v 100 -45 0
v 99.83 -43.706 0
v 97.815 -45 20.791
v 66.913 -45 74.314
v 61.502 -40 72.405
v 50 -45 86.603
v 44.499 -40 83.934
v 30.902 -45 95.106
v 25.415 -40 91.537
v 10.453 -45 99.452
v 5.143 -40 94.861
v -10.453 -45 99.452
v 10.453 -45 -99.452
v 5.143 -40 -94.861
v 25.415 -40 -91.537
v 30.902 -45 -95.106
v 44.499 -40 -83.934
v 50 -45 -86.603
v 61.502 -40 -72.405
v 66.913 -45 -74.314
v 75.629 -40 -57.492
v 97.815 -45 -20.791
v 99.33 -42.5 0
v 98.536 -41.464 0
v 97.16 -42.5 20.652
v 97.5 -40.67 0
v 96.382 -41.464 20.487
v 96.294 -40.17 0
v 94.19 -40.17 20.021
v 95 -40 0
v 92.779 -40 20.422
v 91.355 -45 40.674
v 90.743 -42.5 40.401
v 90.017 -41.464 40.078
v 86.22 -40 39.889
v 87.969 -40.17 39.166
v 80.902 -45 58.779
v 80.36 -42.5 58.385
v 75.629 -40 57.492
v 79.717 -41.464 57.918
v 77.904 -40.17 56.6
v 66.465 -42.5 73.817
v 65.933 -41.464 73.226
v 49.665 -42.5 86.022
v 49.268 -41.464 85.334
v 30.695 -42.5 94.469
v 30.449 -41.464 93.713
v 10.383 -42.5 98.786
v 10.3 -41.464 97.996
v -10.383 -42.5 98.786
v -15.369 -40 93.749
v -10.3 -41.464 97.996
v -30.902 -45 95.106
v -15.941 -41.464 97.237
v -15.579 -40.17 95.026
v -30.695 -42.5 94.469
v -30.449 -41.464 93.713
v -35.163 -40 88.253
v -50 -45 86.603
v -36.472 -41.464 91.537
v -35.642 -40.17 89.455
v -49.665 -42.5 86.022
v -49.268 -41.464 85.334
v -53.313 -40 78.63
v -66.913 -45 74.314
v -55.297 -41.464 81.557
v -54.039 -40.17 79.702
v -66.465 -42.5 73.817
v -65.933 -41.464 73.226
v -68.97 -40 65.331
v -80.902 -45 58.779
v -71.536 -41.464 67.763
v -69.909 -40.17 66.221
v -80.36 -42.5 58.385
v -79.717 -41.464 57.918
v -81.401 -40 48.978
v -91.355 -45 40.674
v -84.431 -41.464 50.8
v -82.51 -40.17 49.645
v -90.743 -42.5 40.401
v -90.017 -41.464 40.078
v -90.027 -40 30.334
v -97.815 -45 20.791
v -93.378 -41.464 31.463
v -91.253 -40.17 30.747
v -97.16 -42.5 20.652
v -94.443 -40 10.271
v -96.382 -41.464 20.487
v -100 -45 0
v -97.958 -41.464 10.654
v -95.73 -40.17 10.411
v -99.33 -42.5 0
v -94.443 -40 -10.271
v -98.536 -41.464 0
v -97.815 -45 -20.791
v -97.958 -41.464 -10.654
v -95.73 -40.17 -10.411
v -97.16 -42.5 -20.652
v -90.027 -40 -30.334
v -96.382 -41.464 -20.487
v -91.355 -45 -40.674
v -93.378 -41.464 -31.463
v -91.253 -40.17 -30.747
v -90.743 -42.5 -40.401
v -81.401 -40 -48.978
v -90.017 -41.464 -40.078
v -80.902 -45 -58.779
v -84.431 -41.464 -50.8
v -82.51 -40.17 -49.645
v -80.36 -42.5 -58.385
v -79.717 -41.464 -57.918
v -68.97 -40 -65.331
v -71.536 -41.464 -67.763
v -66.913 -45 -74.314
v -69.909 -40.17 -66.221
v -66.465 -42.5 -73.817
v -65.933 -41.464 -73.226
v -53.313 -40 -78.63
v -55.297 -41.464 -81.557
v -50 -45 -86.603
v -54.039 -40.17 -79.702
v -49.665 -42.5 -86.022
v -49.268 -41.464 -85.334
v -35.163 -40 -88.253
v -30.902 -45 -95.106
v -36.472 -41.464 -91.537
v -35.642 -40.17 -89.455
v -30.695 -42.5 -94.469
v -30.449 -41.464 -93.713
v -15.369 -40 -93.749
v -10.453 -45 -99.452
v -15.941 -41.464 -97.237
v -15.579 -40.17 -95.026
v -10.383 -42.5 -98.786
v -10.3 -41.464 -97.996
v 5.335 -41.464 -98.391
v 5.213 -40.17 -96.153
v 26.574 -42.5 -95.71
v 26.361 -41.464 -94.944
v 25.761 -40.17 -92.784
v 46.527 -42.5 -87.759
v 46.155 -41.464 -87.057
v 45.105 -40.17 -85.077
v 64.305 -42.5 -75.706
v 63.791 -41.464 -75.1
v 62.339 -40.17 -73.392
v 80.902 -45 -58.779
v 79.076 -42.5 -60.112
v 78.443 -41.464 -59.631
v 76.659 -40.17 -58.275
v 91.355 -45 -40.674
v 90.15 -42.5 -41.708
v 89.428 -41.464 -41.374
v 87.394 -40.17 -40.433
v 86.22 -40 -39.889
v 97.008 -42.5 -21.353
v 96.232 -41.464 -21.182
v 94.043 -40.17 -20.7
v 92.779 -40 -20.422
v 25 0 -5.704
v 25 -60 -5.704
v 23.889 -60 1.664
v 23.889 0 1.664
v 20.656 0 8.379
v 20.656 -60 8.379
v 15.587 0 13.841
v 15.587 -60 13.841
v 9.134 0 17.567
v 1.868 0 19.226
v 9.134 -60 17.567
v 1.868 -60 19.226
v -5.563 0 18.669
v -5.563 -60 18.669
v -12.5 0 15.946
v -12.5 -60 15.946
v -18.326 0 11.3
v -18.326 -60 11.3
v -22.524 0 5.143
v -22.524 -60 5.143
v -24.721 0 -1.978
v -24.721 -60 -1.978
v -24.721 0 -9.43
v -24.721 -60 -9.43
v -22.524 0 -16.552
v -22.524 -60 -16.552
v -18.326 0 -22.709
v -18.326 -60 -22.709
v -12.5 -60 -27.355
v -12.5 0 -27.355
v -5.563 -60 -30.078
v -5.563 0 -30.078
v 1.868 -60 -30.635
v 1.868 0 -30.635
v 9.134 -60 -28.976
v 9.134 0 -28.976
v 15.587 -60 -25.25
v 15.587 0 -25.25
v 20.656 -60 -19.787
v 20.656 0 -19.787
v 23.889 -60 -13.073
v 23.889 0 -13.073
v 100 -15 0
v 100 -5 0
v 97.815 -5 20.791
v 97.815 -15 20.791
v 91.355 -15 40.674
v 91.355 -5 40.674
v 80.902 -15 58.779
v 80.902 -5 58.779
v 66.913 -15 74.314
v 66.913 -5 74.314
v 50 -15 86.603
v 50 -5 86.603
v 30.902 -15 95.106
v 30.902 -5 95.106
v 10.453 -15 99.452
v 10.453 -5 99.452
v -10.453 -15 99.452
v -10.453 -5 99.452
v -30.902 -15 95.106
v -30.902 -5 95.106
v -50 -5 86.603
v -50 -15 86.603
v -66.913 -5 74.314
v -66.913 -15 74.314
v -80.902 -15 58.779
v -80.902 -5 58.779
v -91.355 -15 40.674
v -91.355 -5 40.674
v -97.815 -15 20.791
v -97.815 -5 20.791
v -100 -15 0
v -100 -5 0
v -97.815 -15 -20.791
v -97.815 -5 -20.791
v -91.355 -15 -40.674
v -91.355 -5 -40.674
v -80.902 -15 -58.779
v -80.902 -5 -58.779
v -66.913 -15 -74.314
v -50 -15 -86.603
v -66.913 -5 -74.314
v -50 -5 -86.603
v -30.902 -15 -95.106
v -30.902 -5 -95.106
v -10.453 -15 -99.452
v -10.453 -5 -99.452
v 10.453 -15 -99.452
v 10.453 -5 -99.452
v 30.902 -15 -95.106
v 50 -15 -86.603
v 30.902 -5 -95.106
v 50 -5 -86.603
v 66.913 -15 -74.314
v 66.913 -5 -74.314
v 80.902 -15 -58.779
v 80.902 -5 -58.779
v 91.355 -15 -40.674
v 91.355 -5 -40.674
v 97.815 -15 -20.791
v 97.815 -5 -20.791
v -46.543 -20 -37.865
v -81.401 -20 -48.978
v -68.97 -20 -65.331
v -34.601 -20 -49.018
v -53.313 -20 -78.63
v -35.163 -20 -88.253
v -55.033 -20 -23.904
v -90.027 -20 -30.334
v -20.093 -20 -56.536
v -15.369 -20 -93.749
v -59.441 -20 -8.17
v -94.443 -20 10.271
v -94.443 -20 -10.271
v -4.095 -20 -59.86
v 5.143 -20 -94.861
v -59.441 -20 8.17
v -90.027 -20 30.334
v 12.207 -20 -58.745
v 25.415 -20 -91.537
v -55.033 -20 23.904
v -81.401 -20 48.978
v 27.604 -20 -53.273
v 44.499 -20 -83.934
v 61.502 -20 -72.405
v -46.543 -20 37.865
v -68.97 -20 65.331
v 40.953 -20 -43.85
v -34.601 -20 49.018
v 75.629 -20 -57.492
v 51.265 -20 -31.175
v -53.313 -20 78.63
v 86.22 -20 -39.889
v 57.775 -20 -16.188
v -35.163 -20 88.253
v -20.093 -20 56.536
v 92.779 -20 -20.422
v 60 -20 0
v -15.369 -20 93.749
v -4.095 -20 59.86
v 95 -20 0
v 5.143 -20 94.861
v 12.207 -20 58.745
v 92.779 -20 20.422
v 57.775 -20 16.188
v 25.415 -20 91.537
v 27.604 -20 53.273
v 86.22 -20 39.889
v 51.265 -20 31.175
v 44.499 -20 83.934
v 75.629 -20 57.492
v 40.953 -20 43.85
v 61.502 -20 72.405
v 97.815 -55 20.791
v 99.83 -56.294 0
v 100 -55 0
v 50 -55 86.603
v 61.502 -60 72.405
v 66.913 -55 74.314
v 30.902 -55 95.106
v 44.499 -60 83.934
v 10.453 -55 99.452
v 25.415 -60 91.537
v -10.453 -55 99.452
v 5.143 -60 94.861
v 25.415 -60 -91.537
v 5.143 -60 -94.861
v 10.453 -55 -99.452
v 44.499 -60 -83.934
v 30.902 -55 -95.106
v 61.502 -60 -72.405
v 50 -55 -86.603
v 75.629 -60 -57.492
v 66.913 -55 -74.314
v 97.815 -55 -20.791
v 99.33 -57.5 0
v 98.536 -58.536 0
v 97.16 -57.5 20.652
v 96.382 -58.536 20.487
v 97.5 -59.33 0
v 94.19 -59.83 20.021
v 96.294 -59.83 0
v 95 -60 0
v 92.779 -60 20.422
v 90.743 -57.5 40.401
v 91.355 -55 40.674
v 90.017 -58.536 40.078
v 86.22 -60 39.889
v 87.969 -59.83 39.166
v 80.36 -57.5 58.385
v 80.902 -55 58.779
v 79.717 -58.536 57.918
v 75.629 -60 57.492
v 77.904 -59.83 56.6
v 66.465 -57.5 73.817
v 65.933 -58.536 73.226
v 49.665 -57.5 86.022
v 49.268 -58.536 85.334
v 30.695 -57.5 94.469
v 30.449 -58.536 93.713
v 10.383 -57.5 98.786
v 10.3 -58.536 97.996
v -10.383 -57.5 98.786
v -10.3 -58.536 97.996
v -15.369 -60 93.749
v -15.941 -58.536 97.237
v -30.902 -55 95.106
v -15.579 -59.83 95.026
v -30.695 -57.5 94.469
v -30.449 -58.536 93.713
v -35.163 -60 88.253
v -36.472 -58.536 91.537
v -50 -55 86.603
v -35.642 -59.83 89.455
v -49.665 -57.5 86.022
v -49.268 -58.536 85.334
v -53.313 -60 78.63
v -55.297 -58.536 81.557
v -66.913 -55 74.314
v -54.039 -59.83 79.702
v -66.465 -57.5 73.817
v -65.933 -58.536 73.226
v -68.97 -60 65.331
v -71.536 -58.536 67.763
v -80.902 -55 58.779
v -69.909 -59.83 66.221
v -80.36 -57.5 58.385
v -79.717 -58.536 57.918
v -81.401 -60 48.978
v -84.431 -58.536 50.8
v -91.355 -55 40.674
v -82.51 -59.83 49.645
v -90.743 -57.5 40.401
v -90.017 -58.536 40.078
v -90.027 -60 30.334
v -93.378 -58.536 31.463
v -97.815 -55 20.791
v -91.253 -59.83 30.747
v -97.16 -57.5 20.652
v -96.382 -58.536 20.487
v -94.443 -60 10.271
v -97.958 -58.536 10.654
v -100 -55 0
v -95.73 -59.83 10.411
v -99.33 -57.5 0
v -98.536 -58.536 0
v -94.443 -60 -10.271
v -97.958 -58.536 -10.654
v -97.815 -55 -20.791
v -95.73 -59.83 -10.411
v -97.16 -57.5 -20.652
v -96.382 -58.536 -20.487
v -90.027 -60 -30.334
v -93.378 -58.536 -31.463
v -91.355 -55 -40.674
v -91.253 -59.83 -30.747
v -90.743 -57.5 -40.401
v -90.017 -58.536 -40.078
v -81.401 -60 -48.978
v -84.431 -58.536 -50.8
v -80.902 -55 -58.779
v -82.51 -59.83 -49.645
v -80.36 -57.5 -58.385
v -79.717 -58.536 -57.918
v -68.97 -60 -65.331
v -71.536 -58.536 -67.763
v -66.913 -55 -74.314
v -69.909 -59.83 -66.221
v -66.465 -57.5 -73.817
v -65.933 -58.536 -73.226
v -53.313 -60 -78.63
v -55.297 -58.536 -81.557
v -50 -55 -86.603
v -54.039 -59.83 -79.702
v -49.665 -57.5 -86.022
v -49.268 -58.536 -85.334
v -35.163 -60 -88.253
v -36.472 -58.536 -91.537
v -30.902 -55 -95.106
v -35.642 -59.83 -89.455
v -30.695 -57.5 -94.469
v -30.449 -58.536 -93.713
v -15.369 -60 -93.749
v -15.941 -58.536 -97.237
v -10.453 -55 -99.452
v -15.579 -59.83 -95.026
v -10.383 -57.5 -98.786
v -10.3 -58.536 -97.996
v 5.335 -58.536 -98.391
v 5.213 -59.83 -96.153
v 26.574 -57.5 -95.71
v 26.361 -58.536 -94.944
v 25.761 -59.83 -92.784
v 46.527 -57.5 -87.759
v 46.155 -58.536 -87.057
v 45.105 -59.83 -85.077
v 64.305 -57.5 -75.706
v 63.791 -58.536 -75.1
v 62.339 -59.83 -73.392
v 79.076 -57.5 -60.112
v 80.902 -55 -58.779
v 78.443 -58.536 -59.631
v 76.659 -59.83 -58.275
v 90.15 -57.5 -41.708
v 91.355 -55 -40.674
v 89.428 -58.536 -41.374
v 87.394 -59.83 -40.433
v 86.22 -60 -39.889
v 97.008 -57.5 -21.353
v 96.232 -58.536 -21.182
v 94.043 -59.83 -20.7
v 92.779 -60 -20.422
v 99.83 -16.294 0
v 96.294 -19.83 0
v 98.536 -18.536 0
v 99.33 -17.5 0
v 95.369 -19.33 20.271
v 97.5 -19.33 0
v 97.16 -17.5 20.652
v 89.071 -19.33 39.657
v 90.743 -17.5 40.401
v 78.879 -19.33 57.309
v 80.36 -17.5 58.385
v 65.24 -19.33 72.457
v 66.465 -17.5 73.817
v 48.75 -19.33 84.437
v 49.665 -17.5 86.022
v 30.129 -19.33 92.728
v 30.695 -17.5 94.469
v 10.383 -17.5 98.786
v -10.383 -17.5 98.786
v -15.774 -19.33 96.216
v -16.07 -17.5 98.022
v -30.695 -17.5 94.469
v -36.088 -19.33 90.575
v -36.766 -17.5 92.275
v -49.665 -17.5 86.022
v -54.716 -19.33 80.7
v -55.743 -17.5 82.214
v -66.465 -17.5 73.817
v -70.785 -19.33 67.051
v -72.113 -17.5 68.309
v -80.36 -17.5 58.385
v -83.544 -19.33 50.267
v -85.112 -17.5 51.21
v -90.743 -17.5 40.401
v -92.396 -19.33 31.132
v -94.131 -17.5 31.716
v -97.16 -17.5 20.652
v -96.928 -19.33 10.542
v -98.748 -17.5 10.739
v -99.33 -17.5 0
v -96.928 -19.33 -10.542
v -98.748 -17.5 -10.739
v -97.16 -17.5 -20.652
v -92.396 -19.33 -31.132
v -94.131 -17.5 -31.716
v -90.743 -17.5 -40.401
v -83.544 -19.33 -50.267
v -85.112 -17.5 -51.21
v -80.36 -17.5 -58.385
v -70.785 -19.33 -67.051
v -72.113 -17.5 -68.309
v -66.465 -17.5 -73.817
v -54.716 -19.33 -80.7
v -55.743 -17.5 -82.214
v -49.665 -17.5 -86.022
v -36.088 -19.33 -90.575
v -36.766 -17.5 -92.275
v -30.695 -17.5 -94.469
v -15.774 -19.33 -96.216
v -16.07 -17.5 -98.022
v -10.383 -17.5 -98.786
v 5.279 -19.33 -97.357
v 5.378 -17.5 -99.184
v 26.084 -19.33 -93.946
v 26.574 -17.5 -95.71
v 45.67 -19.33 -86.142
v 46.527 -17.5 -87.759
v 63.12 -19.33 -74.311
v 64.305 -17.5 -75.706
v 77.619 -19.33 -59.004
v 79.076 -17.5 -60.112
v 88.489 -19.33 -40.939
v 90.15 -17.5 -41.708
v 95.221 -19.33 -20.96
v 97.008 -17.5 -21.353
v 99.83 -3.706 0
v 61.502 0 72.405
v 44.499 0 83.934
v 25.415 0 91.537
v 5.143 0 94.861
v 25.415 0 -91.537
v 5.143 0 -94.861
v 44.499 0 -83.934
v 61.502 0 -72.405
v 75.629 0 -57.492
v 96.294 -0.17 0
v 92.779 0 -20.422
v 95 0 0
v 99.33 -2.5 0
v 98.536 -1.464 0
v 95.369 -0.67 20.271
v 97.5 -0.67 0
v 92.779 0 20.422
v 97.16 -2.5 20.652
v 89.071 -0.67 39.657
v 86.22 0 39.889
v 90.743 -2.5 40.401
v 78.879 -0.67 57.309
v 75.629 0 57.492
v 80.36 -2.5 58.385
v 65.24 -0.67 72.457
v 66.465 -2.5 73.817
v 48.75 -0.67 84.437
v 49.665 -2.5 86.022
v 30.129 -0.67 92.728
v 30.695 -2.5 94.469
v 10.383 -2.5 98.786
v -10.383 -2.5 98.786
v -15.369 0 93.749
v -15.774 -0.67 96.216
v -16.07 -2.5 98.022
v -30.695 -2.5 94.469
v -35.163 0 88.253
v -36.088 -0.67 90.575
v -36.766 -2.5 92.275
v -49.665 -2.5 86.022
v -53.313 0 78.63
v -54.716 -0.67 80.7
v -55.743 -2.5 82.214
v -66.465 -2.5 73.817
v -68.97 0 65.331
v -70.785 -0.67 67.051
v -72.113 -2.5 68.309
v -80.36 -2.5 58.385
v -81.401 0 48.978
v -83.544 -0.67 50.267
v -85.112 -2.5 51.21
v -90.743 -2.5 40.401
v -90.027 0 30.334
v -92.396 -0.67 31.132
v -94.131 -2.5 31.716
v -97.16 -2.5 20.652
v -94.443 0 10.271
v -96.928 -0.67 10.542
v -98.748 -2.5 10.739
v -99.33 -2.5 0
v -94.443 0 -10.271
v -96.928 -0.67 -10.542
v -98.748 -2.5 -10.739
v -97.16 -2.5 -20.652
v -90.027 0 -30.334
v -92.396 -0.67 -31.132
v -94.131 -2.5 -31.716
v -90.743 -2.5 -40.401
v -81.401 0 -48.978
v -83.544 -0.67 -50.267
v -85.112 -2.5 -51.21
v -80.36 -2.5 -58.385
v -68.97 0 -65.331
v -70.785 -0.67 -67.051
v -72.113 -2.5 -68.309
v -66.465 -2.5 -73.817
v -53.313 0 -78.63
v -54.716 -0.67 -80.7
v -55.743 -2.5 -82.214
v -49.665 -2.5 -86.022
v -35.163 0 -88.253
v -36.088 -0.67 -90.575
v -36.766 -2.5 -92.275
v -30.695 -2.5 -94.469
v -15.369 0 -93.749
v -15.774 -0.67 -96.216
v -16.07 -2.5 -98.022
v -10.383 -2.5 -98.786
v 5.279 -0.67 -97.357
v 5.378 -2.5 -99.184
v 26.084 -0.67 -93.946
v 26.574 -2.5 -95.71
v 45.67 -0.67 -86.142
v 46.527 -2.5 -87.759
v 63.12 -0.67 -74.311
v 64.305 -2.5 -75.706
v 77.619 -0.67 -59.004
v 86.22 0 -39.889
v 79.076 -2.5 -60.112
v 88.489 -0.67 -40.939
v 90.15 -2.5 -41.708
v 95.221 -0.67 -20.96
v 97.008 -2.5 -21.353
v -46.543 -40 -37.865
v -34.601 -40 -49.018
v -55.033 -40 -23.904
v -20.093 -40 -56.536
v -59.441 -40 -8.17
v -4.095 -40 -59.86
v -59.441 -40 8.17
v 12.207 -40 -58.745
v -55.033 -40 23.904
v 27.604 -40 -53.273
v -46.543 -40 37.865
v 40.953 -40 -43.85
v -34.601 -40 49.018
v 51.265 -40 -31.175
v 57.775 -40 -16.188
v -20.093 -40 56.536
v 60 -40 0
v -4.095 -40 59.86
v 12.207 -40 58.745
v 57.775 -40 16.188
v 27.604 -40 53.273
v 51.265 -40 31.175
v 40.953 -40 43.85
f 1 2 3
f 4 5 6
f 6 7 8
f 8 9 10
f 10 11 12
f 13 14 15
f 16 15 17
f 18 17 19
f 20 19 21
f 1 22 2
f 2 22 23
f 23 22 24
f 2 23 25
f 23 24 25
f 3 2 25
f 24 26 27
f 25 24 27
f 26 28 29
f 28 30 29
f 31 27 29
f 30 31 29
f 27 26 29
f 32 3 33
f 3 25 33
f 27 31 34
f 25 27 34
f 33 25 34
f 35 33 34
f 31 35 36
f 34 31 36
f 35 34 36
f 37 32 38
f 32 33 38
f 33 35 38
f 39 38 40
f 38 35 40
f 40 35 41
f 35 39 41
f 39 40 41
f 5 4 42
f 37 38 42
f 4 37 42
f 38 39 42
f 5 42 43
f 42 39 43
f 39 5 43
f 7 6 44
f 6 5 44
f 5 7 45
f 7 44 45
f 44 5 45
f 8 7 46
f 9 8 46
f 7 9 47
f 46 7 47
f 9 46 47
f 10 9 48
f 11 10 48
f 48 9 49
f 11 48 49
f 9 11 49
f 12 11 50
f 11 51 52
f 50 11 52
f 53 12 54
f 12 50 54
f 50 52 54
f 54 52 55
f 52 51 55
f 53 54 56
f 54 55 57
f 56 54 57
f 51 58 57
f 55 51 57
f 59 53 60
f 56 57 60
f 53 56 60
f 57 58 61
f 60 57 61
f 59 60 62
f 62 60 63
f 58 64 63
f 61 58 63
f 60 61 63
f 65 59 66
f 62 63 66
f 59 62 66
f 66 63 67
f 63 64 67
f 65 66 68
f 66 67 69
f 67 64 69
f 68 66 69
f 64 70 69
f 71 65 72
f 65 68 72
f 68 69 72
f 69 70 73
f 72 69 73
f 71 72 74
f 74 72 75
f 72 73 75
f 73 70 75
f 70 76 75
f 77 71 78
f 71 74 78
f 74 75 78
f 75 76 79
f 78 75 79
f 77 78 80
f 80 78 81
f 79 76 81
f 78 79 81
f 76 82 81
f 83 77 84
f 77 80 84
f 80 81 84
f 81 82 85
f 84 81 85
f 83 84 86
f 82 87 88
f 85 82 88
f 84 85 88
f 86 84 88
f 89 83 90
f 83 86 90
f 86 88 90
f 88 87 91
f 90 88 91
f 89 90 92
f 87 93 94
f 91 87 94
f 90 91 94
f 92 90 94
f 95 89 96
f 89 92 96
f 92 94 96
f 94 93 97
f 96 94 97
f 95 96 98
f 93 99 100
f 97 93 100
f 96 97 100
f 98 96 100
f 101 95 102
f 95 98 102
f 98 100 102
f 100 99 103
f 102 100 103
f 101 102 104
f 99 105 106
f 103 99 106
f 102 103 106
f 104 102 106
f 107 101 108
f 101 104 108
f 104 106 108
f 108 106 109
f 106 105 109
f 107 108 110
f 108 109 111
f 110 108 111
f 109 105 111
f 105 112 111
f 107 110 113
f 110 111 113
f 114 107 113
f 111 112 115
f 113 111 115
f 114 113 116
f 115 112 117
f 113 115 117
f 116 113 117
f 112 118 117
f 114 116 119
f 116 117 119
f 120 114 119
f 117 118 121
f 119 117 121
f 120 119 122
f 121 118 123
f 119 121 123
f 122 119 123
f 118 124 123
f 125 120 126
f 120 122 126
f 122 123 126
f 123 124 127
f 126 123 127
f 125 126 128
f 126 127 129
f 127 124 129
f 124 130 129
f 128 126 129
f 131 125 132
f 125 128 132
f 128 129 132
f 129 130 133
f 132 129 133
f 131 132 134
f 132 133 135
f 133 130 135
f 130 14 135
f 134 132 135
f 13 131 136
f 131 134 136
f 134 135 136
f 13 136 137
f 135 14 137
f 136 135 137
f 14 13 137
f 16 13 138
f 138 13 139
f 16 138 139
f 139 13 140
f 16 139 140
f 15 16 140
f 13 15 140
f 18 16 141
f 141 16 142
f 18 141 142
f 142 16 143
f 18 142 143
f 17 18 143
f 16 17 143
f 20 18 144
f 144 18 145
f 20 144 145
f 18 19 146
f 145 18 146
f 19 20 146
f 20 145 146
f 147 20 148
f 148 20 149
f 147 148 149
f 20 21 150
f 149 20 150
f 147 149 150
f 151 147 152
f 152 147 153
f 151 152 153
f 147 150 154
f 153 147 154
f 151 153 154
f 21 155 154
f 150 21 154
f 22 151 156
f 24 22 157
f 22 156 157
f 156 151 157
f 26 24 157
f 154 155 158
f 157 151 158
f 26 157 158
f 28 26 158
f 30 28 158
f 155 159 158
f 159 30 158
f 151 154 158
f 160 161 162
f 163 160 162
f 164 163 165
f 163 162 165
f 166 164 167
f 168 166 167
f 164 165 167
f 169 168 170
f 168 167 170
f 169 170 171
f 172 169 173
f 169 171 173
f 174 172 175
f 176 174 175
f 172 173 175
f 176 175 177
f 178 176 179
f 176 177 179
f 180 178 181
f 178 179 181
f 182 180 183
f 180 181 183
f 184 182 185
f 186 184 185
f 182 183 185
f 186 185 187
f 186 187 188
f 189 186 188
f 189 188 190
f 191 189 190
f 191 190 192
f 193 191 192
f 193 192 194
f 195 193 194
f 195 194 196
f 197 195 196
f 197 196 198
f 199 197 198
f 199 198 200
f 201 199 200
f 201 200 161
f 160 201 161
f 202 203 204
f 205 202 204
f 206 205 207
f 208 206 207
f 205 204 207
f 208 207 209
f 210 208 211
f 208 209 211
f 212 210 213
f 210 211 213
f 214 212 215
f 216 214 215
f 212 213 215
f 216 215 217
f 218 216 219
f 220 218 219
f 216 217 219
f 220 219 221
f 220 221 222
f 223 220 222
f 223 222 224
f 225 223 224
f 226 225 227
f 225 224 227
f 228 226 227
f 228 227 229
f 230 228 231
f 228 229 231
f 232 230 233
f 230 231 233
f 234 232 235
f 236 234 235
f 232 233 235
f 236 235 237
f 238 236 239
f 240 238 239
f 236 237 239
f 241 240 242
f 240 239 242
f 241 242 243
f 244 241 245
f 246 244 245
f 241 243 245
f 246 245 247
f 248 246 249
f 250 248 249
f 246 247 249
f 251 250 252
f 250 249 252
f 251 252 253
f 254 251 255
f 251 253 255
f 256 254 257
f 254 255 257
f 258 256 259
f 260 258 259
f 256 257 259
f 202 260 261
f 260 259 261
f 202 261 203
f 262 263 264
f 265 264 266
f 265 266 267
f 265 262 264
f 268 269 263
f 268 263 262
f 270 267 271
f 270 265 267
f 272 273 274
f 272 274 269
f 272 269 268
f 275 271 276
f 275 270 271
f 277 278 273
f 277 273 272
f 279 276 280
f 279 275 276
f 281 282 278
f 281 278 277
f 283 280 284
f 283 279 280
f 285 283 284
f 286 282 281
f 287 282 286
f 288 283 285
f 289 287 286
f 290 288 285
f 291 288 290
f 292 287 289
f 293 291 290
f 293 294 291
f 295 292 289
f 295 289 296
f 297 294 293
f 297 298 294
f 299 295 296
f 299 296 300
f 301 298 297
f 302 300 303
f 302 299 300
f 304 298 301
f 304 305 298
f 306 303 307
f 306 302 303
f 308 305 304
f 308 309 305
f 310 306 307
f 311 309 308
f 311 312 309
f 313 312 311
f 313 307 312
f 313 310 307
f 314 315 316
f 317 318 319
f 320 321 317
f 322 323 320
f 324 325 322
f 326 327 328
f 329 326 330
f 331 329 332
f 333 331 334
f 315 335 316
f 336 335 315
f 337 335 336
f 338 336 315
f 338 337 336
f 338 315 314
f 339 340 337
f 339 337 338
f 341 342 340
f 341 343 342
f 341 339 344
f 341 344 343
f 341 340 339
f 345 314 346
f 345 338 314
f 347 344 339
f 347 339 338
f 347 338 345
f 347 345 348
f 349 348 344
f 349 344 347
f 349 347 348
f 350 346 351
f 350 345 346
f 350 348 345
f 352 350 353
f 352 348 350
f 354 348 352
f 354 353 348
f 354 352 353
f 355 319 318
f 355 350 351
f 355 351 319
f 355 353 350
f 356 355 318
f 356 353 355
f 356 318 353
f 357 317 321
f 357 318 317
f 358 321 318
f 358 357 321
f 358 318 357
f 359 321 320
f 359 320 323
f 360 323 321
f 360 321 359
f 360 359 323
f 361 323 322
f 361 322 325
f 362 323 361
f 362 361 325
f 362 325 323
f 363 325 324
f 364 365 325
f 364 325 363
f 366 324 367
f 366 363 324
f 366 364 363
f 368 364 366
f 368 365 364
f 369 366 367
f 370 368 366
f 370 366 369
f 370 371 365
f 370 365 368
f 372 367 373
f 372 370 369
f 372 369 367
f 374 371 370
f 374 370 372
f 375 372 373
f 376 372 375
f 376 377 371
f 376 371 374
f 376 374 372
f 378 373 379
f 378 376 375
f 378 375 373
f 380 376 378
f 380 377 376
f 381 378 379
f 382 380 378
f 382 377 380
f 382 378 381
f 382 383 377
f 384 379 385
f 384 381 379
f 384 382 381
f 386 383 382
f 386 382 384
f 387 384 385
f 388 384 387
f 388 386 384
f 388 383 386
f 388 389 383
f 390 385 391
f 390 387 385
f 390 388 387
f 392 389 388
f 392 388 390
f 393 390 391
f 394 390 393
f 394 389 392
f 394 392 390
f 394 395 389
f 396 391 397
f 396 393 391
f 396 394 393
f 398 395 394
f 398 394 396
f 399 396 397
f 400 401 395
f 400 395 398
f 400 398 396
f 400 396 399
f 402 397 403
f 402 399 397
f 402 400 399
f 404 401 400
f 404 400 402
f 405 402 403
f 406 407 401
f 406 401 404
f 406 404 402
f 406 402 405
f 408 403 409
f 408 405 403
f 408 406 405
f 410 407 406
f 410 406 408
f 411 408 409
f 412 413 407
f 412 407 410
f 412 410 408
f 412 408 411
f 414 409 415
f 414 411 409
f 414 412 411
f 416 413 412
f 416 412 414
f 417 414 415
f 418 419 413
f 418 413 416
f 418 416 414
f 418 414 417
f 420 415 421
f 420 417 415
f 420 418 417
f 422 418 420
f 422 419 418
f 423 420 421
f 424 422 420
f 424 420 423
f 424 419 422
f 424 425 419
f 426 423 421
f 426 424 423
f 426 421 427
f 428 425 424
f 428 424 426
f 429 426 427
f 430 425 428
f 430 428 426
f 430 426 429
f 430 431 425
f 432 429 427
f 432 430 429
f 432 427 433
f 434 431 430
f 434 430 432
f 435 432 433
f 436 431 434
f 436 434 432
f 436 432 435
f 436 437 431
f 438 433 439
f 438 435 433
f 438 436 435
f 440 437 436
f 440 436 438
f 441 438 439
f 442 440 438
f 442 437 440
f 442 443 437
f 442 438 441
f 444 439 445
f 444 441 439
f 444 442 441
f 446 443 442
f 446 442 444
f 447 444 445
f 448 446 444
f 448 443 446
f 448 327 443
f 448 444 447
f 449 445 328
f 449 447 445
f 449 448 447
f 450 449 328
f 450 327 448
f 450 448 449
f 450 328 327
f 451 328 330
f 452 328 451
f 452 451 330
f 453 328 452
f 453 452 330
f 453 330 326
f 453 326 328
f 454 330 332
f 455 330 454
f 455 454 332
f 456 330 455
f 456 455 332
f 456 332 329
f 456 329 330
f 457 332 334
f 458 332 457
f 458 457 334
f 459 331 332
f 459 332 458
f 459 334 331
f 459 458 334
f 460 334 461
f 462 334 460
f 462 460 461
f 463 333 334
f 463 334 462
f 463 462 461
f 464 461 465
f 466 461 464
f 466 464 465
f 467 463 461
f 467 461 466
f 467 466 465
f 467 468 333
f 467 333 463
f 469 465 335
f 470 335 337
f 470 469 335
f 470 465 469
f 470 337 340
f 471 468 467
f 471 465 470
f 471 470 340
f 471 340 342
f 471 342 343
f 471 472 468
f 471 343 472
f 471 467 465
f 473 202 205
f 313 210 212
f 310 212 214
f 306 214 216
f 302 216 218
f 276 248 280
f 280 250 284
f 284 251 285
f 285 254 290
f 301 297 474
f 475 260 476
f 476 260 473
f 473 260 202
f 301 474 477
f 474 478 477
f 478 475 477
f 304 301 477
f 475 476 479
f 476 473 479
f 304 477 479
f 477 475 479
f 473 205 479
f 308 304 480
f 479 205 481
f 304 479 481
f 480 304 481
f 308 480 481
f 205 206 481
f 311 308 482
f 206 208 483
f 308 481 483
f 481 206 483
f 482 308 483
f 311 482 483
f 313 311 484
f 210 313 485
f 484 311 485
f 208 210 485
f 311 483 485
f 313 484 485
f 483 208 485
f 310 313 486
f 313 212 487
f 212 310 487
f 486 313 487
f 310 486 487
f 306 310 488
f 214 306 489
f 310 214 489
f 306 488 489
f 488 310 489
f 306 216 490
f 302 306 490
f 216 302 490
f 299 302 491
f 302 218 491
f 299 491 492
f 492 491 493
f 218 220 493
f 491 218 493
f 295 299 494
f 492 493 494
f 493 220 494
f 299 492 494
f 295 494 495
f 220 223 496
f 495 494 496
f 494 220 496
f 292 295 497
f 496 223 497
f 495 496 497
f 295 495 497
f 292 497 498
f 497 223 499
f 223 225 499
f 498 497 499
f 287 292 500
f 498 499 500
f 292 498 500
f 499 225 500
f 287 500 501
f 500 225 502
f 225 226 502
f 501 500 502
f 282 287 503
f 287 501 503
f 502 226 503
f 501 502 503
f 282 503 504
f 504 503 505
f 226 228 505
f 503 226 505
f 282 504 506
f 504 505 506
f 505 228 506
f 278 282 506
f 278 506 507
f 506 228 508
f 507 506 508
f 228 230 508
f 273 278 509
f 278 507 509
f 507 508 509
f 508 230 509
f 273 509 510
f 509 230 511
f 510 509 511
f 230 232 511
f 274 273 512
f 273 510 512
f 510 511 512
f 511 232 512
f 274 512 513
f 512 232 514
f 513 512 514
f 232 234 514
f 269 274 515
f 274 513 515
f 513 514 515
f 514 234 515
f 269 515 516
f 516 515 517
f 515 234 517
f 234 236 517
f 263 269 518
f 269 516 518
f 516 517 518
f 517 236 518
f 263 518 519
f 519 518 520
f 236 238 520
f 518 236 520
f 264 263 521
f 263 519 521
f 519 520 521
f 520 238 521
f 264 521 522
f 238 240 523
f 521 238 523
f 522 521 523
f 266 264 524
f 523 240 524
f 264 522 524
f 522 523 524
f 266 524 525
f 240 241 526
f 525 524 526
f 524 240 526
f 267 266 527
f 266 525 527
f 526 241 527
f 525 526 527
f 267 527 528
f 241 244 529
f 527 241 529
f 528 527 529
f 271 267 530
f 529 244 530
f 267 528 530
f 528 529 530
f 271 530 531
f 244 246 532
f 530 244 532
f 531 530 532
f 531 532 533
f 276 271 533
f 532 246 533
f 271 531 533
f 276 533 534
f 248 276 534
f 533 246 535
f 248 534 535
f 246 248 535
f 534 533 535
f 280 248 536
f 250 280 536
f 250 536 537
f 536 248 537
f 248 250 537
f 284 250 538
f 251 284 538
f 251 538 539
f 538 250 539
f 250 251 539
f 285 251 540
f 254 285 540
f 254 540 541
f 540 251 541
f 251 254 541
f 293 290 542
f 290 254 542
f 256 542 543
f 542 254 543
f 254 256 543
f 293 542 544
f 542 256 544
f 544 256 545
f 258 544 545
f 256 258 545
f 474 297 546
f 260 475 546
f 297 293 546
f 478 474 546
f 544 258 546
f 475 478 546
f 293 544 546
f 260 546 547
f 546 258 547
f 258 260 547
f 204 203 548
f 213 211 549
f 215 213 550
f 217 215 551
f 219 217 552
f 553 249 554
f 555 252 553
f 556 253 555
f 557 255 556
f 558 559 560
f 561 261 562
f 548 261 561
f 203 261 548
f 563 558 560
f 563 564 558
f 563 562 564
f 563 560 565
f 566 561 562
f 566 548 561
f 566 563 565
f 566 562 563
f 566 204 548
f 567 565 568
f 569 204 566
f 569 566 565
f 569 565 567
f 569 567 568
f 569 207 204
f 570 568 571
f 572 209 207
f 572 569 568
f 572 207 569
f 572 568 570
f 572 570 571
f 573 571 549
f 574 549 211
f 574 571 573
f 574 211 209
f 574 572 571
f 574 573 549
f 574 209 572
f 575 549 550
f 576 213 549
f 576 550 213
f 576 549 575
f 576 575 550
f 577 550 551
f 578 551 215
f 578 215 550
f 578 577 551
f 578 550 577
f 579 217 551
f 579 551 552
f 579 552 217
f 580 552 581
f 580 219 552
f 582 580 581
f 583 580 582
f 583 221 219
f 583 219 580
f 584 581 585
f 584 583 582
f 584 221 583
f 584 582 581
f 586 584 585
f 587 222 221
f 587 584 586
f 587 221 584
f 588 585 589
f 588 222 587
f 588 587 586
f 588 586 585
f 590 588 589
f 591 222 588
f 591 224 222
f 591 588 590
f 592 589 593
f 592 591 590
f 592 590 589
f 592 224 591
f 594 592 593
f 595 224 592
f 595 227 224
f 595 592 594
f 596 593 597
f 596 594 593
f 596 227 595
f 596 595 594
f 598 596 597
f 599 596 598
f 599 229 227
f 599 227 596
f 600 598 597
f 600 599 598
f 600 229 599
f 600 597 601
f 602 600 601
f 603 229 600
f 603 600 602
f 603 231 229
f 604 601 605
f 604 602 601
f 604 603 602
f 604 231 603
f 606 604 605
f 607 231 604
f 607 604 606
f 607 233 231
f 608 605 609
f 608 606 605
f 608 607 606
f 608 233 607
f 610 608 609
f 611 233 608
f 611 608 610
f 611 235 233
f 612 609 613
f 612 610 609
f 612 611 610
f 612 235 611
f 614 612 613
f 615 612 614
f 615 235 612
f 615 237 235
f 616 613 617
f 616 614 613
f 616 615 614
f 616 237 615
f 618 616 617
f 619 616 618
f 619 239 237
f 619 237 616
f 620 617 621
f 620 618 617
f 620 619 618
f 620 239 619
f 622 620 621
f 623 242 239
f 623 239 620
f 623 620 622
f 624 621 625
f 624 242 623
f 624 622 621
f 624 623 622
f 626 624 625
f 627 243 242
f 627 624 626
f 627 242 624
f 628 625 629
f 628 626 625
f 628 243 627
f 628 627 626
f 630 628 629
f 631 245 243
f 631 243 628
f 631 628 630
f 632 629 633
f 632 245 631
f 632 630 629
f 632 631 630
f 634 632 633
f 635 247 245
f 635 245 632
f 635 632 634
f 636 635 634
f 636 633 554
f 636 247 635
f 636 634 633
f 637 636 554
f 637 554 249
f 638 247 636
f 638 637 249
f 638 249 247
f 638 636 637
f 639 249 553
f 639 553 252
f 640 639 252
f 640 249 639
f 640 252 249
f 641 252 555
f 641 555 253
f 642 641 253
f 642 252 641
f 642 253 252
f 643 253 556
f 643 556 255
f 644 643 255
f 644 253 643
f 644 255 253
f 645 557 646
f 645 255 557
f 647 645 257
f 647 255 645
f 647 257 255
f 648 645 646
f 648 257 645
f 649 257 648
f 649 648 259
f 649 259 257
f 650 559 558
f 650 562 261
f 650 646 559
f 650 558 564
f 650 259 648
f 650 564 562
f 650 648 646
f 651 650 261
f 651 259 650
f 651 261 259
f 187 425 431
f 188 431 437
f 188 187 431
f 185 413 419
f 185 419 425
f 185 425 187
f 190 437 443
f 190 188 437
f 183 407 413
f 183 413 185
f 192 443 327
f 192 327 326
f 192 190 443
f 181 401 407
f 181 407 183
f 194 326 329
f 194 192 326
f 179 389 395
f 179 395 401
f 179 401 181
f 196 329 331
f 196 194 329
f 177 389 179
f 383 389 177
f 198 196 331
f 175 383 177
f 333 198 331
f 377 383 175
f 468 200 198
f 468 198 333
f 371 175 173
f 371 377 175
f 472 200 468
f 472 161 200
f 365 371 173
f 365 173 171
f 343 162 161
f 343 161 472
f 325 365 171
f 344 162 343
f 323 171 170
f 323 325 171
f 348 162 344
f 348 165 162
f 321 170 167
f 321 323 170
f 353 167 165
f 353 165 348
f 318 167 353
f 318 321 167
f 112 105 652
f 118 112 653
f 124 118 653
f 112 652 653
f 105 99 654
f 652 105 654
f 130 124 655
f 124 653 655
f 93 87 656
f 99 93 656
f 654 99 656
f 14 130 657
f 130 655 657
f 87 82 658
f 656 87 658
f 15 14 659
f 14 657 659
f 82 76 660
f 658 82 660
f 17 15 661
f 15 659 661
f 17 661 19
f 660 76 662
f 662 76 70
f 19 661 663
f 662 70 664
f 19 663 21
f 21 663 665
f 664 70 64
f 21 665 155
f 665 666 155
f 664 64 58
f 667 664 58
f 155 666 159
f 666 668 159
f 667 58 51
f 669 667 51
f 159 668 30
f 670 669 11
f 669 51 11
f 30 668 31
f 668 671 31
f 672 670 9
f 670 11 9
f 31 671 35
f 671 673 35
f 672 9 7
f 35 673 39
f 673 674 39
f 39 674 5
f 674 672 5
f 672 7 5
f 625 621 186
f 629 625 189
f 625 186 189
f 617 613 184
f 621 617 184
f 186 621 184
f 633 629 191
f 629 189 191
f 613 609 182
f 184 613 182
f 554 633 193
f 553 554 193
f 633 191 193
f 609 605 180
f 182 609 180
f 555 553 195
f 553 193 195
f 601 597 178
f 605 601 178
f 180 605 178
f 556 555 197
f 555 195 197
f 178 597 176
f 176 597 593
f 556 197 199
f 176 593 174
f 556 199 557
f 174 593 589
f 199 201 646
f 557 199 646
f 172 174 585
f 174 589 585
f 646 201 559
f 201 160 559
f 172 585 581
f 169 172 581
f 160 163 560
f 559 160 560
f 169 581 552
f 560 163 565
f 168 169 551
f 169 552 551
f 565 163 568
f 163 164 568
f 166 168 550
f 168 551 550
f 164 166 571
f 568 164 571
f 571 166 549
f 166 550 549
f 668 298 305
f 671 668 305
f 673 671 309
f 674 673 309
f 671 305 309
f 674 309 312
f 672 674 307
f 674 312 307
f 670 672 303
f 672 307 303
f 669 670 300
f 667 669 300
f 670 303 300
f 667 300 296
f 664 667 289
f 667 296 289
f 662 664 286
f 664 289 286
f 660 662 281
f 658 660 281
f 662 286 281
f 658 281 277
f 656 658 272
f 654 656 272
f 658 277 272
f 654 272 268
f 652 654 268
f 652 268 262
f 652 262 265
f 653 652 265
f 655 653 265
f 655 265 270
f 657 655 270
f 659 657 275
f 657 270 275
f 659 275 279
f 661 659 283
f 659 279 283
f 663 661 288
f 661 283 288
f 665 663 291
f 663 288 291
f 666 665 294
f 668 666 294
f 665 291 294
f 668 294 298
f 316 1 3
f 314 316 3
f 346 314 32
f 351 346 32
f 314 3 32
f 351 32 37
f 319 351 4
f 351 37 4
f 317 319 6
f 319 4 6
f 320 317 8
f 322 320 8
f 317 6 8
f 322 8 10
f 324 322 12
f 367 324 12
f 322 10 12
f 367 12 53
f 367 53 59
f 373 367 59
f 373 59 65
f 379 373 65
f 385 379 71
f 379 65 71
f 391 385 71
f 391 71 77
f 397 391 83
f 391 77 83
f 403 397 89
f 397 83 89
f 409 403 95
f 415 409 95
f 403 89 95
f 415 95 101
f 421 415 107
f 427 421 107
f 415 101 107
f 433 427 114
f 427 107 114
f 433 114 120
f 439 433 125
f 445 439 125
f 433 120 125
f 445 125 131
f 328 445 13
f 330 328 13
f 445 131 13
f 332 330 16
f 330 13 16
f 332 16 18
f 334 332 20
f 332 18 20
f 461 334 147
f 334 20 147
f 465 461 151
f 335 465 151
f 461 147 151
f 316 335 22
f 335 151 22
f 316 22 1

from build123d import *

# Parameters (mm, degrees)
F0_R     = 100
F1_DEPTH = 20
F2_R     = 60
F3_DEPTH = 20
F4_R     = 100
F5_DEPTH = 20
F6_R     = 25
F7_DEPTH = 100
F8_R     = 5


with BuildPart() as f1:
    # F0 (on Front) → F1 (new body)
    with BuildSketch(Plane.XZ):
        Circle(F0_R)
    extrude(amount=F1_DEPTH)

    # F2 (on face) → F3 (join)
    with BuildSketch(Plane.XZ.offset(20)):
        Circle(F2_R)
    extrude(amount=F3_DEPTH)

    # F4 (on face) → F5 (join)
    with BuildSketch(Plane.XZ.offset(40)):
        Circle(F4_R)
    extrude(amount=F5_DEPTH)

    # F6 (on face) → F7 (cut)
    with BuildSketch(Plane.XZ.offset(60)):
        with Locations((0, -5.704428)):
            Circle(F6_R)
    extrude(amount=-F7_DEPTH, mode=Mode.SUBTRACT)

    # F8
    f8_edges = [f1.edges().sort_by_distance(p)[0] for p in [
        (-100, -60, 0),
        (-100, -40, 0),
        (-100, -20, 0),
        (-100, 0, 0),
    ]]
    fillet(f8_edges, radius=F8_R)


solid = f1.part
